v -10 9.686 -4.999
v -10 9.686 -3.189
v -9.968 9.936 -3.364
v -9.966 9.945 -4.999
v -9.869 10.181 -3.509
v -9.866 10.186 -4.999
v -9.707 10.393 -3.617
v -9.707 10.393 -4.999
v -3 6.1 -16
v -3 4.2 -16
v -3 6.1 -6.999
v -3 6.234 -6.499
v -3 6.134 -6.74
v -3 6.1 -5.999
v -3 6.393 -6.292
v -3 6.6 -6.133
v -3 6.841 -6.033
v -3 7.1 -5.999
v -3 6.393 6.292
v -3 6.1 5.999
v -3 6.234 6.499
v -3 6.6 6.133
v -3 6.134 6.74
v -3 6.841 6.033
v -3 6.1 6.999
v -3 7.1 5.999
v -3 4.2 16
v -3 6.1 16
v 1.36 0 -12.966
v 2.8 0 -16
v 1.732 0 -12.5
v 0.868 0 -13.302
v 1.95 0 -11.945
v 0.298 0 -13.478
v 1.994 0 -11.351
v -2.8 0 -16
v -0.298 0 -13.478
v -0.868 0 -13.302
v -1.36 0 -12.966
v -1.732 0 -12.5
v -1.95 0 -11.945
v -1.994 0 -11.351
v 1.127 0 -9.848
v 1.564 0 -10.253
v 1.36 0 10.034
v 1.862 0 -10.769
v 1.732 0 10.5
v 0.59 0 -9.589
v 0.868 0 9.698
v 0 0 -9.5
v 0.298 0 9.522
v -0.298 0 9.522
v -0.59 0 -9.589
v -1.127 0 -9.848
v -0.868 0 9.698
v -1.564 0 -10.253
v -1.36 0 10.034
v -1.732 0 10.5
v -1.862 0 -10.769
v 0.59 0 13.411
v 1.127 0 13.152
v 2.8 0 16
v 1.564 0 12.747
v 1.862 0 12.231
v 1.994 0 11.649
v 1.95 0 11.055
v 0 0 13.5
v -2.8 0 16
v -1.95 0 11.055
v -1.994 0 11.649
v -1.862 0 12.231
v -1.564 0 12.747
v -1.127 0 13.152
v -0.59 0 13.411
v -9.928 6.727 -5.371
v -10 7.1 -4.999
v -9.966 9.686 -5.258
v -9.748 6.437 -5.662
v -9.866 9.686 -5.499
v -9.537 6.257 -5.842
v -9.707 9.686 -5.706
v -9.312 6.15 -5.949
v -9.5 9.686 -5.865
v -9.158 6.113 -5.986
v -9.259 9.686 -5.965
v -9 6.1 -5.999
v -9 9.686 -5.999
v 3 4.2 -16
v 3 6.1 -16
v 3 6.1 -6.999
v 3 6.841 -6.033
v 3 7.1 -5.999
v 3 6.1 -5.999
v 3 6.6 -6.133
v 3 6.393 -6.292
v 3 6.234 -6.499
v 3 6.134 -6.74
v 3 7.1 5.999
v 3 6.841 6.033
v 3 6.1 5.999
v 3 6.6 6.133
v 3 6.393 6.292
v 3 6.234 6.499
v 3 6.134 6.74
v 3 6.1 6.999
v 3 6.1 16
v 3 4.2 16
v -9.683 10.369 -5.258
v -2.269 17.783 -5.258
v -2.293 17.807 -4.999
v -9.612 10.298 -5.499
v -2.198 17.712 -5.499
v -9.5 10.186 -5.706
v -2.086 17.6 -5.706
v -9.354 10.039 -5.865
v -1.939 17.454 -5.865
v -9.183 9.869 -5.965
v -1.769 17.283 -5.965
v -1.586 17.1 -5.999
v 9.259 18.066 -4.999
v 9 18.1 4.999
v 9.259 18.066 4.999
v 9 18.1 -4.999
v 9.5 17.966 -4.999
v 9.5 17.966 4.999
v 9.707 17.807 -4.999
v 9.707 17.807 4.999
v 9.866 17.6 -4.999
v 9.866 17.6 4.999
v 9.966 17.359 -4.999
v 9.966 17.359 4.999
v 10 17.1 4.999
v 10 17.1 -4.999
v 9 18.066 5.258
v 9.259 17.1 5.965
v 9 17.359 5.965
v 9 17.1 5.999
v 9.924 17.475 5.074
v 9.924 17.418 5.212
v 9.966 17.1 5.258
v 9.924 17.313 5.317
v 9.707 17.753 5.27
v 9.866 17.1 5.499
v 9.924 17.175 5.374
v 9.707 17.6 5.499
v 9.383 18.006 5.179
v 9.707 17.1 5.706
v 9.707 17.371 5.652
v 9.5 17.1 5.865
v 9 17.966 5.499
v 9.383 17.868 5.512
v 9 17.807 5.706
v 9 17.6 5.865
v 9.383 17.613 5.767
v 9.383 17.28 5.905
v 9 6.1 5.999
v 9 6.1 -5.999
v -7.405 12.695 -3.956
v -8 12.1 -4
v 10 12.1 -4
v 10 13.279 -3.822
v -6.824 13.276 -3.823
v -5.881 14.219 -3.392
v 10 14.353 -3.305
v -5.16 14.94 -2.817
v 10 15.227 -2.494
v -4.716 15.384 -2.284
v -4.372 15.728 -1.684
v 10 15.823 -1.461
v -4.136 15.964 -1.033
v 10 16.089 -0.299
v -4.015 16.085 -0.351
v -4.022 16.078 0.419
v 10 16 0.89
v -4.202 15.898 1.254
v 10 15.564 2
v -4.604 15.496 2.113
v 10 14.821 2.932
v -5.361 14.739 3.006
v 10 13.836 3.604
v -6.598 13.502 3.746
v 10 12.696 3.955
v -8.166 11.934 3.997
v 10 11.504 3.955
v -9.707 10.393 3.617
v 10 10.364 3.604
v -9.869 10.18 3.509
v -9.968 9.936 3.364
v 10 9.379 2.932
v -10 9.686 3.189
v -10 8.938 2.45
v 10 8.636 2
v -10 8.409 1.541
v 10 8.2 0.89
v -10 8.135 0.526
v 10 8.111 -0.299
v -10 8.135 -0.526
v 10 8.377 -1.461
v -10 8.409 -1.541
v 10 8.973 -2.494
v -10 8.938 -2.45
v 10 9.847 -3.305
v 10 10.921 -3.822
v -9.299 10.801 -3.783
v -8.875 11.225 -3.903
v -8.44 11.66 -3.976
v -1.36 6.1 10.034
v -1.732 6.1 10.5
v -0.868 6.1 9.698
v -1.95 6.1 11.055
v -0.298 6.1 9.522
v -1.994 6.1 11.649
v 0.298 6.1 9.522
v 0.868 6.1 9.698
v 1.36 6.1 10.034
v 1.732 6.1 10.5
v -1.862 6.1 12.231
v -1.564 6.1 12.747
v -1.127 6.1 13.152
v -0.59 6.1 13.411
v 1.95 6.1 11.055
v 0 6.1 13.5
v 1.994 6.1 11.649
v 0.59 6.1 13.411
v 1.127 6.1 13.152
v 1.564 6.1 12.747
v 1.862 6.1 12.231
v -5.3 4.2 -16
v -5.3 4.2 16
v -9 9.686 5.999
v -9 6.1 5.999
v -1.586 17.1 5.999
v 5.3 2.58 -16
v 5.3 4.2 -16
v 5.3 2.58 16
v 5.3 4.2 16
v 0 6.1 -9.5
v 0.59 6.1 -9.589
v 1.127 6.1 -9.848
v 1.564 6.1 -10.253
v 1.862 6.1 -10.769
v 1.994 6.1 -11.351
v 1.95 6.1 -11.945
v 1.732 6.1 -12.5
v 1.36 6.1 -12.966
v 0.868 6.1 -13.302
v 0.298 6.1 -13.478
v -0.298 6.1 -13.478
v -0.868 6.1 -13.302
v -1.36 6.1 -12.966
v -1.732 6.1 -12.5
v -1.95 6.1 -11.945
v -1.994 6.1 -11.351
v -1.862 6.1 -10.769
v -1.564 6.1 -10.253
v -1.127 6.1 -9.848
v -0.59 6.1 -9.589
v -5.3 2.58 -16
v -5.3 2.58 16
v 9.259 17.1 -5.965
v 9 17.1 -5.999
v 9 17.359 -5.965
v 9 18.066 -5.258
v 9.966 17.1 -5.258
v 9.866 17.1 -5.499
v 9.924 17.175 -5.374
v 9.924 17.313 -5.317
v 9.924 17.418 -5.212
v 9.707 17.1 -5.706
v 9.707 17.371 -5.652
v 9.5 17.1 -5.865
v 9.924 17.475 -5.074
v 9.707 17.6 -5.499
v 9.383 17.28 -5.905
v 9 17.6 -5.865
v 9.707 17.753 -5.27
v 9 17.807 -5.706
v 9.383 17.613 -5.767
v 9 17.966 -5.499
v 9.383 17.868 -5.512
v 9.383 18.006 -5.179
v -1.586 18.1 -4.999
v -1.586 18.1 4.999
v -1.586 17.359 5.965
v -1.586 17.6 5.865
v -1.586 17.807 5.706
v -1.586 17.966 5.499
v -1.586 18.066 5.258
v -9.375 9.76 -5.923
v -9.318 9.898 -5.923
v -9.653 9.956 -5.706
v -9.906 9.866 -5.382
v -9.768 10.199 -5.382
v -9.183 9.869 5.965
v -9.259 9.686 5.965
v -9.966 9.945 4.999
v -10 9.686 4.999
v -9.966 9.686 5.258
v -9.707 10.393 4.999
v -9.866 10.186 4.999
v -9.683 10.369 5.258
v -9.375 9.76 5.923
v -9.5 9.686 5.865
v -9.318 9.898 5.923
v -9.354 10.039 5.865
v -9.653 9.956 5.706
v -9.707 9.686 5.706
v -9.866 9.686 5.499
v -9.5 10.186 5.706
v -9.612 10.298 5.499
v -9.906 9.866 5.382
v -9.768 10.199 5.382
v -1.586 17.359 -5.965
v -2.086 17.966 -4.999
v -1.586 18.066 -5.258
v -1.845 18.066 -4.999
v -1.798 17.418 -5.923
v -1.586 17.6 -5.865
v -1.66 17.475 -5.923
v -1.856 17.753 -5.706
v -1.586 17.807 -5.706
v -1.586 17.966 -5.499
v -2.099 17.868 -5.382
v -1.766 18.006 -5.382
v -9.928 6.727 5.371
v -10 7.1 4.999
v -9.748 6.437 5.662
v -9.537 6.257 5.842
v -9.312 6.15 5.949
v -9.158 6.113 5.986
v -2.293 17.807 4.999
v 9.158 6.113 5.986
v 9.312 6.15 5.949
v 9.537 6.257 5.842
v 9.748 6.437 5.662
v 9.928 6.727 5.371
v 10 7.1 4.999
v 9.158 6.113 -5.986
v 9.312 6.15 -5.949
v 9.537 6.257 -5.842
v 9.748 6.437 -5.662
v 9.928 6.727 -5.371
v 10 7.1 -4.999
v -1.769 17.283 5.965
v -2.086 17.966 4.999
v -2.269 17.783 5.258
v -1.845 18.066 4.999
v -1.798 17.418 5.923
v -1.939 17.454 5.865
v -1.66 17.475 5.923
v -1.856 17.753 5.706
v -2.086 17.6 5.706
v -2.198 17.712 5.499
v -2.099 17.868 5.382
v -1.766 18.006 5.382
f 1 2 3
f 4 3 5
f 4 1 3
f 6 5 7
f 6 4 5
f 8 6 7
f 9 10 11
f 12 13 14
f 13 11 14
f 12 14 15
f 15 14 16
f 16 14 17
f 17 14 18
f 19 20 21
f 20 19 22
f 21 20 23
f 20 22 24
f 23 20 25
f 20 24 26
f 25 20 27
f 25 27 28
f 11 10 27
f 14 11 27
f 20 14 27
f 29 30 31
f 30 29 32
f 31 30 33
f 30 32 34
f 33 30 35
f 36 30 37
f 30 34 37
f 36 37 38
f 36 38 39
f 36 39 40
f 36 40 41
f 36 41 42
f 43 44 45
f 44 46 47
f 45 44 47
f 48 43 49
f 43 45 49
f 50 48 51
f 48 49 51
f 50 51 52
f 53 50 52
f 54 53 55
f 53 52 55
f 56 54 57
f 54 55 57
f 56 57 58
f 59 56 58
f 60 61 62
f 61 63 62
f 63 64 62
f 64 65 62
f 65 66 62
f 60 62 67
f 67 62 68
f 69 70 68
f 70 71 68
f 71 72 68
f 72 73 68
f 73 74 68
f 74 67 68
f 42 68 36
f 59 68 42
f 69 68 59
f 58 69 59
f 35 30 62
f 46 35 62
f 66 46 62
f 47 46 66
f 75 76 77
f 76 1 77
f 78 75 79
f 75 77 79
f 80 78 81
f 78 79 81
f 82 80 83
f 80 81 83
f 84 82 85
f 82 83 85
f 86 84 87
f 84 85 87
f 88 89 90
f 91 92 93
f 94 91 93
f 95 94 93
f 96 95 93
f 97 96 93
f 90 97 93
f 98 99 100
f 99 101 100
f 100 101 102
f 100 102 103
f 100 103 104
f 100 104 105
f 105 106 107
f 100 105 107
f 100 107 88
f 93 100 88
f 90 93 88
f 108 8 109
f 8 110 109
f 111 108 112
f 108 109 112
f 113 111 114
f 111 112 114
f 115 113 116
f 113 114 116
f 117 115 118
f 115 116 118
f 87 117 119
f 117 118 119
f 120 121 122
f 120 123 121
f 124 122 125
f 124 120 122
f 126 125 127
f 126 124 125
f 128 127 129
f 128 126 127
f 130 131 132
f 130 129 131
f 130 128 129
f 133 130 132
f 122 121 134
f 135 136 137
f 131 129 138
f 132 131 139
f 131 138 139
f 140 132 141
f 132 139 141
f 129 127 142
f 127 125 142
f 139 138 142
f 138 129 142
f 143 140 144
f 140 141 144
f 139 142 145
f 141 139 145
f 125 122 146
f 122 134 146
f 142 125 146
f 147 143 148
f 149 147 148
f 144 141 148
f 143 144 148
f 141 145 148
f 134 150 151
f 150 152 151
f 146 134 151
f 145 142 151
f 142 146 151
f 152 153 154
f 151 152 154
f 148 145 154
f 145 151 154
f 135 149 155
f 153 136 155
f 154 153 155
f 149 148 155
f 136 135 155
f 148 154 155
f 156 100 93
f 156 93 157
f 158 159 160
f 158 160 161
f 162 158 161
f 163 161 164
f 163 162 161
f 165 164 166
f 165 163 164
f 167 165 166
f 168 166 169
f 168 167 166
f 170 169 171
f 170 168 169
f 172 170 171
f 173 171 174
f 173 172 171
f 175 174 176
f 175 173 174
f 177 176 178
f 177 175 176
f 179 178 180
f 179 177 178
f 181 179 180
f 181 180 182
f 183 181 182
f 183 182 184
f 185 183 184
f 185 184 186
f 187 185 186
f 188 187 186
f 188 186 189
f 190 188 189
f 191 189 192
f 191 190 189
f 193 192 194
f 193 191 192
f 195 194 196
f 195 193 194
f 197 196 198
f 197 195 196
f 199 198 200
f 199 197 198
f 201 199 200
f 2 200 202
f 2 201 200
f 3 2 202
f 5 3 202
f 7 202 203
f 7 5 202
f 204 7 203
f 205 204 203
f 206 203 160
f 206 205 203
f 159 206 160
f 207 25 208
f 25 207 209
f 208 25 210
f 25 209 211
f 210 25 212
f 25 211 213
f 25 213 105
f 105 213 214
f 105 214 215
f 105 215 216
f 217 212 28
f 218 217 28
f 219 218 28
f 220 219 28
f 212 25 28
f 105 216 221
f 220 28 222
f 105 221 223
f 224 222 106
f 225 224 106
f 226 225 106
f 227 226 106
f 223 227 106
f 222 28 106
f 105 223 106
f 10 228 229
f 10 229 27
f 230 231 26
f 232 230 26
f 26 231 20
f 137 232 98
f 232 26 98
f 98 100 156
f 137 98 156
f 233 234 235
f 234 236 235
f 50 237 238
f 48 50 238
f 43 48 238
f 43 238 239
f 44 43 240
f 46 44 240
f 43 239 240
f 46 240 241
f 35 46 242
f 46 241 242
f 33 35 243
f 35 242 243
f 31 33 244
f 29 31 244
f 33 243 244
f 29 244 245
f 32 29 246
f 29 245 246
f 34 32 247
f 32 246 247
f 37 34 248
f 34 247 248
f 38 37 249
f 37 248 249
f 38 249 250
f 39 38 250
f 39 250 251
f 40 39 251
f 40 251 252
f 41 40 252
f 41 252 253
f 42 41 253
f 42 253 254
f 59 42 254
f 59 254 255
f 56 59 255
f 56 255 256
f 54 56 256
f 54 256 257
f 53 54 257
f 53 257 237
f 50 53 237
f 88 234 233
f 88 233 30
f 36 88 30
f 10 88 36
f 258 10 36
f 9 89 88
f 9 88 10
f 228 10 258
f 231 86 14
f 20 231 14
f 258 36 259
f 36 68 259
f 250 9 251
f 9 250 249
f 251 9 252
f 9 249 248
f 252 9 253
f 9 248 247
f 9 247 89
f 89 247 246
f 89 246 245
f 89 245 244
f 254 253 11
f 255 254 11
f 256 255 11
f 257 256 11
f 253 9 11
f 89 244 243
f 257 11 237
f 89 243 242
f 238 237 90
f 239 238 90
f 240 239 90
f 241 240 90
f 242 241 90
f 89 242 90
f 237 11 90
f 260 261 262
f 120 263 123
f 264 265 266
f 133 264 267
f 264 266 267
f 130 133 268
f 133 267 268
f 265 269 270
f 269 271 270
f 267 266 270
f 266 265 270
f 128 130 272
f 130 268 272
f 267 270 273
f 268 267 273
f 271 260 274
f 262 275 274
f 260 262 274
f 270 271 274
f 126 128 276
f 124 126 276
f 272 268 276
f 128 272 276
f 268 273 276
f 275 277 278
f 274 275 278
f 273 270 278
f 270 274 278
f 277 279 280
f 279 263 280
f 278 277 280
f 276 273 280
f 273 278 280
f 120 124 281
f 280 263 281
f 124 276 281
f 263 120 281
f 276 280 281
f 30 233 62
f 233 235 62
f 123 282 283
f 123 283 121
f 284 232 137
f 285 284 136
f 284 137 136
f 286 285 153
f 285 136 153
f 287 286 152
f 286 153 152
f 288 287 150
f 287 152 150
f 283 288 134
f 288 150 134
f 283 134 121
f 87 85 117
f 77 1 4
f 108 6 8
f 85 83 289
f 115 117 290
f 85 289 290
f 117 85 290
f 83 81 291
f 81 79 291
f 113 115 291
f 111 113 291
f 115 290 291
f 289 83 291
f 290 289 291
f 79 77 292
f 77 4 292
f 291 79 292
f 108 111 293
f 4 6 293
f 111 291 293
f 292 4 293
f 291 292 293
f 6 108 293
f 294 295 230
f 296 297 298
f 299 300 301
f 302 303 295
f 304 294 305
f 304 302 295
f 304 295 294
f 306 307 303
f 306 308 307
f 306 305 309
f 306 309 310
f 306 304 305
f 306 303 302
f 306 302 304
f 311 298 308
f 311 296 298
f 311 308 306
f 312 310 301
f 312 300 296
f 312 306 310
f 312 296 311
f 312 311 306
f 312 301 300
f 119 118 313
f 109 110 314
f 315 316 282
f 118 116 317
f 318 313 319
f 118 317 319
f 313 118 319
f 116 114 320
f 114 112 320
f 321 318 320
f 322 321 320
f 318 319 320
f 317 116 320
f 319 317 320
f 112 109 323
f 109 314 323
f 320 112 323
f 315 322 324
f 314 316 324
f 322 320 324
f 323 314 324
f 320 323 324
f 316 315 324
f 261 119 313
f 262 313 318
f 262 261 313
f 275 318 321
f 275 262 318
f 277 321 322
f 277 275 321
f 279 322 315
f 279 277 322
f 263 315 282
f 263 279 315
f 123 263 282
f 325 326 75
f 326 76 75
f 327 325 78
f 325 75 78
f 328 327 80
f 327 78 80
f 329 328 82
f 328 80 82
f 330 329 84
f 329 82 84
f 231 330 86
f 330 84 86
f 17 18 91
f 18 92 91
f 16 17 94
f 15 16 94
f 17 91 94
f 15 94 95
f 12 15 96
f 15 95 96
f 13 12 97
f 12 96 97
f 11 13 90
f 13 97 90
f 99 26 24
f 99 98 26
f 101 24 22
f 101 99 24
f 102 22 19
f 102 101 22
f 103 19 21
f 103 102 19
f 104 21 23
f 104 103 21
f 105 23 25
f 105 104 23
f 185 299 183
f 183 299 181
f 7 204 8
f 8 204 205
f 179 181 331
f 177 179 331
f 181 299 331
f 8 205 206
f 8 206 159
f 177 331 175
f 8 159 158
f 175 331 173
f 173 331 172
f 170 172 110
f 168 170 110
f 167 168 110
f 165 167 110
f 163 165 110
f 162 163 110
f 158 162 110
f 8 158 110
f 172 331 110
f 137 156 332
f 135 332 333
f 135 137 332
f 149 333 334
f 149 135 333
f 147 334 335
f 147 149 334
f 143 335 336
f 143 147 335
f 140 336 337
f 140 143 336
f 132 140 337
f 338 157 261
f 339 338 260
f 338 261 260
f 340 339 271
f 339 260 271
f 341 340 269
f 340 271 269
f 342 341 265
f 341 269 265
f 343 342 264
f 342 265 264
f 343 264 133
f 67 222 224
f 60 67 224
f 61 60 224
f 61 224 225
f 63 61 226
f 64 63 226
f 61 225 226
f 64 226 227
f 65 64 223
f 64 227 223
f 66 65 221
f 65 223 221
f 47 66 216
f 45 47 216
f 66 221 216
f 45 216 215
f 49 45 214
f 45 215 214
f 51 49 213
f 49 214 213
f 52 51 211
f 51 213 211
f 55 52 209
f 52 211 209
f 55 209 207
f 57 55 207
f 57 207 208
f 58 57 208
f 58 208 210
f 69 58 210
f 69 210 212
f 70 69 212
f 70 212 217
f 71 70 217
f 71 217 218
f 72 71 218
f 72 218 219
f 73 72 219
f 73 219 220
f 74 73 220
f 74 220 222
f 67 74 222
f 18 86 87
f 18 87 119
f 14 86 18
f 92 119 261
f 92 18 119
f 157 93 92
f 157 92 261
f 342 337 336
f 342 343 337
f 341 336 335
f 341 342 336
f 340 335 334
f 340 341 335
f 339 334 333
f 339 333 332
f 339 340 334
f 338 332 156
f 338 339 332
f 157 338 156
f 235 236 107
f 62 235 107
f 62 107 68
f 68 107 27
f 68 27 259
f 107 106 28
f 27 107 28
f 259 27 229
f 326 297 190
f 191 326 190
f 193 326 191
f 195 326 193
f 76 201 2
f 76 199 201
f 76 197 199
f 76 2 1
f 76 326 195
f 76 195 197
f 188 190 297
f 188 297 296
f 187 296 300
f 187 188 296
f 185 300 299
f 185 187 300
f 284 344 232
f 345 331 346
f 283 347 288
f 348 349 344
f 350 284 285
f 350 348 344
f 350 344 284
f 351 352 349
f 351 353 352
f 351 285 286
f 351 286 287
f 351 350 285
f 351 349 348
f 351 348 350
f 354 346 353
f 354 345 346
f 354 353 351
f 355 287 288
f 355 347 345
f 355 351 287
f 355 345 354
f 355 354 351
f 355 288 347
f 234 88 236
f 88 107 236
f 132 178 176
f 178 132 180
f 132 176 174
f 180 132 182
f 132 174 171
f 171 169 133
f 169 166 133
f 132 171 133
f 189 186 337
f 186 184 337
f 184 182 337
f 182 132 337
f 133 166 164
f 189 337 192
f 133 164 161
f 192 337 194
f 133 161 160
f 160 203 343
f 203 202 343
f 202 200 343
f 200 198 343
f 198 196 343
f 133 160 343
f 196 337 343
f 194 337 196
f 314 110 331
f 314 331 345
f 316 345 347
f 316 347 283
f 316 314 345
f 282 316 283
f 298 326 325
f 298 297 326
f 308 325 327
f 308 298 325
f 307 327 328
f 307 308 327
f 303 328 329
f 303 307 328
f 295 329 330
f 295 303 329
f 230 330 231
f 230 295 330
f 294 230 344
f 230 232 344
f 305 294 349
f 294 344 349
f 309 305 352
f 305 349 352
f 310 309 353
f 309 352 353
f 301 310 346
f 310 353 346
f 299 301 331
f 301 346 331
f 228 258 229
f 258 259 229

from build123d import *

# Parameters (mm, degrees)
BOSS_EXTRUDE1_DEPTH     = 16
SKETCH2_W               = 20
SKETCH2_H               = 11.997864578
BOSS_EXTRUDE2_DEPTH     = 12
CHAMFER1_SIZE           = 8
FILLET1_R               = 1
CUT_EXTRUDE1_DEPTH      = 27.145936587
CUT_EXTRUDE1_DEPTH_BACK = 27.145936587
SKETCH3_R               = 4
SKETCH4_R               = 2
CUT_EXTRUDE2_DEPTH      = 23.36067982


with BuildPart() as part:
    # Sketch1 → Boss-Extrude1 (new, symmetric)
    with BuildSketch(Plane.XY):
        Polygon((-3, 6.1), (3, 6.1), (3, 4.2), (5.3, 4.2), (5.3, 2.58), (2.8, 0), (-2.8, 0), (-5.3, 2.58), (-5.3, 4.2), (-3, 4.2), align=None)
    extrude(amount=BOSS_EXTRUDE1_DEPTH, both=True)

    # Sketch2 → Boss-Extrude2 (add)
    with BuildSketch(Plane(origin=(0, 6.1, 0), x_dir=(1, 0, 0), z_dir=(0, 1, 0))):
        Rectangle(SKETCH2_W, SKETCH2_H)
    extrude(amount=BOSS_EXTRUDE2_DEPTH)

    # Chamfer1
    chamfer1_edges = [part.edges().sort_by_distance(p)[0] for p in [
        (-10, 18.1, 0),
    ]]
    chamfer(chamfer1_edges, length=CHAMFER1_SIZE)

    # Fillet1
    fillet1_edges = [part.edges().sort_by_distance(p)[0] for p in [
        (0, 6.1, -5.998932289),
        (0, 6.1, 5.998932289),
        (-10, 6.1, 0),
        (-10, 8.1, 5.998932289),
        (-10, 8.1, -5.998932289),
        (10, 6.1, 0),
        (-6, 14.1, 5.998932289),
        (-6, 14.1, -5.998932289),
        (4, 18.1, -5.998932289),
        (4, 18.1, 5.998932289),
        (10, 12.1, -5.998932289),
        (10, 18.1, 0),
        (10, 12.1, 5.998932289),
        (-2, 18.1, 0),
        (-10, 10.1, 0),
    ]]
    fillet(fillet1_edges, radius=FILLET1_R)

    # Sketch3 → Cut-Extrude1 (cut, two sides: drawn at the far end of the back side and taken through both)
    with BuildSketch(Plane(origin=(0, 0, 0), x_dir=(0, 0, -1), z_dir=(1, 0, 0)).offset(-CUT_EXTRUDE1_DEPTH_BACK)):
        with Locations((0, 12.1)):
            Circle(SKETCH3_R)
    extrude(amount=CUT_EXTRUDE1_DEPTH + CUT_EXTRUDE1_DEPTH_BACK, mode=Mode.SUBTRACT)

    # Sketch4 → Cut-Extrude2 (cut, through all)
    with BuildSketch(Plane(origin=(0, 6.1, 0), x_dir=(1, 0, 0), z_dir=(0, 1, 0))):
        with Locations(Location((0, 11.5, 0), (0, 0, 270))):
            Circle(SKETCH4_R)
        with Locations(Location((0, -11.5, 0), (0, 0, 270))):
            Circle(SKETCH4_R)
    extrude(amount=-CUT_EXTRUDE2_DEPTH, mode=Mode.SUBTRACT)


solid = part.part
